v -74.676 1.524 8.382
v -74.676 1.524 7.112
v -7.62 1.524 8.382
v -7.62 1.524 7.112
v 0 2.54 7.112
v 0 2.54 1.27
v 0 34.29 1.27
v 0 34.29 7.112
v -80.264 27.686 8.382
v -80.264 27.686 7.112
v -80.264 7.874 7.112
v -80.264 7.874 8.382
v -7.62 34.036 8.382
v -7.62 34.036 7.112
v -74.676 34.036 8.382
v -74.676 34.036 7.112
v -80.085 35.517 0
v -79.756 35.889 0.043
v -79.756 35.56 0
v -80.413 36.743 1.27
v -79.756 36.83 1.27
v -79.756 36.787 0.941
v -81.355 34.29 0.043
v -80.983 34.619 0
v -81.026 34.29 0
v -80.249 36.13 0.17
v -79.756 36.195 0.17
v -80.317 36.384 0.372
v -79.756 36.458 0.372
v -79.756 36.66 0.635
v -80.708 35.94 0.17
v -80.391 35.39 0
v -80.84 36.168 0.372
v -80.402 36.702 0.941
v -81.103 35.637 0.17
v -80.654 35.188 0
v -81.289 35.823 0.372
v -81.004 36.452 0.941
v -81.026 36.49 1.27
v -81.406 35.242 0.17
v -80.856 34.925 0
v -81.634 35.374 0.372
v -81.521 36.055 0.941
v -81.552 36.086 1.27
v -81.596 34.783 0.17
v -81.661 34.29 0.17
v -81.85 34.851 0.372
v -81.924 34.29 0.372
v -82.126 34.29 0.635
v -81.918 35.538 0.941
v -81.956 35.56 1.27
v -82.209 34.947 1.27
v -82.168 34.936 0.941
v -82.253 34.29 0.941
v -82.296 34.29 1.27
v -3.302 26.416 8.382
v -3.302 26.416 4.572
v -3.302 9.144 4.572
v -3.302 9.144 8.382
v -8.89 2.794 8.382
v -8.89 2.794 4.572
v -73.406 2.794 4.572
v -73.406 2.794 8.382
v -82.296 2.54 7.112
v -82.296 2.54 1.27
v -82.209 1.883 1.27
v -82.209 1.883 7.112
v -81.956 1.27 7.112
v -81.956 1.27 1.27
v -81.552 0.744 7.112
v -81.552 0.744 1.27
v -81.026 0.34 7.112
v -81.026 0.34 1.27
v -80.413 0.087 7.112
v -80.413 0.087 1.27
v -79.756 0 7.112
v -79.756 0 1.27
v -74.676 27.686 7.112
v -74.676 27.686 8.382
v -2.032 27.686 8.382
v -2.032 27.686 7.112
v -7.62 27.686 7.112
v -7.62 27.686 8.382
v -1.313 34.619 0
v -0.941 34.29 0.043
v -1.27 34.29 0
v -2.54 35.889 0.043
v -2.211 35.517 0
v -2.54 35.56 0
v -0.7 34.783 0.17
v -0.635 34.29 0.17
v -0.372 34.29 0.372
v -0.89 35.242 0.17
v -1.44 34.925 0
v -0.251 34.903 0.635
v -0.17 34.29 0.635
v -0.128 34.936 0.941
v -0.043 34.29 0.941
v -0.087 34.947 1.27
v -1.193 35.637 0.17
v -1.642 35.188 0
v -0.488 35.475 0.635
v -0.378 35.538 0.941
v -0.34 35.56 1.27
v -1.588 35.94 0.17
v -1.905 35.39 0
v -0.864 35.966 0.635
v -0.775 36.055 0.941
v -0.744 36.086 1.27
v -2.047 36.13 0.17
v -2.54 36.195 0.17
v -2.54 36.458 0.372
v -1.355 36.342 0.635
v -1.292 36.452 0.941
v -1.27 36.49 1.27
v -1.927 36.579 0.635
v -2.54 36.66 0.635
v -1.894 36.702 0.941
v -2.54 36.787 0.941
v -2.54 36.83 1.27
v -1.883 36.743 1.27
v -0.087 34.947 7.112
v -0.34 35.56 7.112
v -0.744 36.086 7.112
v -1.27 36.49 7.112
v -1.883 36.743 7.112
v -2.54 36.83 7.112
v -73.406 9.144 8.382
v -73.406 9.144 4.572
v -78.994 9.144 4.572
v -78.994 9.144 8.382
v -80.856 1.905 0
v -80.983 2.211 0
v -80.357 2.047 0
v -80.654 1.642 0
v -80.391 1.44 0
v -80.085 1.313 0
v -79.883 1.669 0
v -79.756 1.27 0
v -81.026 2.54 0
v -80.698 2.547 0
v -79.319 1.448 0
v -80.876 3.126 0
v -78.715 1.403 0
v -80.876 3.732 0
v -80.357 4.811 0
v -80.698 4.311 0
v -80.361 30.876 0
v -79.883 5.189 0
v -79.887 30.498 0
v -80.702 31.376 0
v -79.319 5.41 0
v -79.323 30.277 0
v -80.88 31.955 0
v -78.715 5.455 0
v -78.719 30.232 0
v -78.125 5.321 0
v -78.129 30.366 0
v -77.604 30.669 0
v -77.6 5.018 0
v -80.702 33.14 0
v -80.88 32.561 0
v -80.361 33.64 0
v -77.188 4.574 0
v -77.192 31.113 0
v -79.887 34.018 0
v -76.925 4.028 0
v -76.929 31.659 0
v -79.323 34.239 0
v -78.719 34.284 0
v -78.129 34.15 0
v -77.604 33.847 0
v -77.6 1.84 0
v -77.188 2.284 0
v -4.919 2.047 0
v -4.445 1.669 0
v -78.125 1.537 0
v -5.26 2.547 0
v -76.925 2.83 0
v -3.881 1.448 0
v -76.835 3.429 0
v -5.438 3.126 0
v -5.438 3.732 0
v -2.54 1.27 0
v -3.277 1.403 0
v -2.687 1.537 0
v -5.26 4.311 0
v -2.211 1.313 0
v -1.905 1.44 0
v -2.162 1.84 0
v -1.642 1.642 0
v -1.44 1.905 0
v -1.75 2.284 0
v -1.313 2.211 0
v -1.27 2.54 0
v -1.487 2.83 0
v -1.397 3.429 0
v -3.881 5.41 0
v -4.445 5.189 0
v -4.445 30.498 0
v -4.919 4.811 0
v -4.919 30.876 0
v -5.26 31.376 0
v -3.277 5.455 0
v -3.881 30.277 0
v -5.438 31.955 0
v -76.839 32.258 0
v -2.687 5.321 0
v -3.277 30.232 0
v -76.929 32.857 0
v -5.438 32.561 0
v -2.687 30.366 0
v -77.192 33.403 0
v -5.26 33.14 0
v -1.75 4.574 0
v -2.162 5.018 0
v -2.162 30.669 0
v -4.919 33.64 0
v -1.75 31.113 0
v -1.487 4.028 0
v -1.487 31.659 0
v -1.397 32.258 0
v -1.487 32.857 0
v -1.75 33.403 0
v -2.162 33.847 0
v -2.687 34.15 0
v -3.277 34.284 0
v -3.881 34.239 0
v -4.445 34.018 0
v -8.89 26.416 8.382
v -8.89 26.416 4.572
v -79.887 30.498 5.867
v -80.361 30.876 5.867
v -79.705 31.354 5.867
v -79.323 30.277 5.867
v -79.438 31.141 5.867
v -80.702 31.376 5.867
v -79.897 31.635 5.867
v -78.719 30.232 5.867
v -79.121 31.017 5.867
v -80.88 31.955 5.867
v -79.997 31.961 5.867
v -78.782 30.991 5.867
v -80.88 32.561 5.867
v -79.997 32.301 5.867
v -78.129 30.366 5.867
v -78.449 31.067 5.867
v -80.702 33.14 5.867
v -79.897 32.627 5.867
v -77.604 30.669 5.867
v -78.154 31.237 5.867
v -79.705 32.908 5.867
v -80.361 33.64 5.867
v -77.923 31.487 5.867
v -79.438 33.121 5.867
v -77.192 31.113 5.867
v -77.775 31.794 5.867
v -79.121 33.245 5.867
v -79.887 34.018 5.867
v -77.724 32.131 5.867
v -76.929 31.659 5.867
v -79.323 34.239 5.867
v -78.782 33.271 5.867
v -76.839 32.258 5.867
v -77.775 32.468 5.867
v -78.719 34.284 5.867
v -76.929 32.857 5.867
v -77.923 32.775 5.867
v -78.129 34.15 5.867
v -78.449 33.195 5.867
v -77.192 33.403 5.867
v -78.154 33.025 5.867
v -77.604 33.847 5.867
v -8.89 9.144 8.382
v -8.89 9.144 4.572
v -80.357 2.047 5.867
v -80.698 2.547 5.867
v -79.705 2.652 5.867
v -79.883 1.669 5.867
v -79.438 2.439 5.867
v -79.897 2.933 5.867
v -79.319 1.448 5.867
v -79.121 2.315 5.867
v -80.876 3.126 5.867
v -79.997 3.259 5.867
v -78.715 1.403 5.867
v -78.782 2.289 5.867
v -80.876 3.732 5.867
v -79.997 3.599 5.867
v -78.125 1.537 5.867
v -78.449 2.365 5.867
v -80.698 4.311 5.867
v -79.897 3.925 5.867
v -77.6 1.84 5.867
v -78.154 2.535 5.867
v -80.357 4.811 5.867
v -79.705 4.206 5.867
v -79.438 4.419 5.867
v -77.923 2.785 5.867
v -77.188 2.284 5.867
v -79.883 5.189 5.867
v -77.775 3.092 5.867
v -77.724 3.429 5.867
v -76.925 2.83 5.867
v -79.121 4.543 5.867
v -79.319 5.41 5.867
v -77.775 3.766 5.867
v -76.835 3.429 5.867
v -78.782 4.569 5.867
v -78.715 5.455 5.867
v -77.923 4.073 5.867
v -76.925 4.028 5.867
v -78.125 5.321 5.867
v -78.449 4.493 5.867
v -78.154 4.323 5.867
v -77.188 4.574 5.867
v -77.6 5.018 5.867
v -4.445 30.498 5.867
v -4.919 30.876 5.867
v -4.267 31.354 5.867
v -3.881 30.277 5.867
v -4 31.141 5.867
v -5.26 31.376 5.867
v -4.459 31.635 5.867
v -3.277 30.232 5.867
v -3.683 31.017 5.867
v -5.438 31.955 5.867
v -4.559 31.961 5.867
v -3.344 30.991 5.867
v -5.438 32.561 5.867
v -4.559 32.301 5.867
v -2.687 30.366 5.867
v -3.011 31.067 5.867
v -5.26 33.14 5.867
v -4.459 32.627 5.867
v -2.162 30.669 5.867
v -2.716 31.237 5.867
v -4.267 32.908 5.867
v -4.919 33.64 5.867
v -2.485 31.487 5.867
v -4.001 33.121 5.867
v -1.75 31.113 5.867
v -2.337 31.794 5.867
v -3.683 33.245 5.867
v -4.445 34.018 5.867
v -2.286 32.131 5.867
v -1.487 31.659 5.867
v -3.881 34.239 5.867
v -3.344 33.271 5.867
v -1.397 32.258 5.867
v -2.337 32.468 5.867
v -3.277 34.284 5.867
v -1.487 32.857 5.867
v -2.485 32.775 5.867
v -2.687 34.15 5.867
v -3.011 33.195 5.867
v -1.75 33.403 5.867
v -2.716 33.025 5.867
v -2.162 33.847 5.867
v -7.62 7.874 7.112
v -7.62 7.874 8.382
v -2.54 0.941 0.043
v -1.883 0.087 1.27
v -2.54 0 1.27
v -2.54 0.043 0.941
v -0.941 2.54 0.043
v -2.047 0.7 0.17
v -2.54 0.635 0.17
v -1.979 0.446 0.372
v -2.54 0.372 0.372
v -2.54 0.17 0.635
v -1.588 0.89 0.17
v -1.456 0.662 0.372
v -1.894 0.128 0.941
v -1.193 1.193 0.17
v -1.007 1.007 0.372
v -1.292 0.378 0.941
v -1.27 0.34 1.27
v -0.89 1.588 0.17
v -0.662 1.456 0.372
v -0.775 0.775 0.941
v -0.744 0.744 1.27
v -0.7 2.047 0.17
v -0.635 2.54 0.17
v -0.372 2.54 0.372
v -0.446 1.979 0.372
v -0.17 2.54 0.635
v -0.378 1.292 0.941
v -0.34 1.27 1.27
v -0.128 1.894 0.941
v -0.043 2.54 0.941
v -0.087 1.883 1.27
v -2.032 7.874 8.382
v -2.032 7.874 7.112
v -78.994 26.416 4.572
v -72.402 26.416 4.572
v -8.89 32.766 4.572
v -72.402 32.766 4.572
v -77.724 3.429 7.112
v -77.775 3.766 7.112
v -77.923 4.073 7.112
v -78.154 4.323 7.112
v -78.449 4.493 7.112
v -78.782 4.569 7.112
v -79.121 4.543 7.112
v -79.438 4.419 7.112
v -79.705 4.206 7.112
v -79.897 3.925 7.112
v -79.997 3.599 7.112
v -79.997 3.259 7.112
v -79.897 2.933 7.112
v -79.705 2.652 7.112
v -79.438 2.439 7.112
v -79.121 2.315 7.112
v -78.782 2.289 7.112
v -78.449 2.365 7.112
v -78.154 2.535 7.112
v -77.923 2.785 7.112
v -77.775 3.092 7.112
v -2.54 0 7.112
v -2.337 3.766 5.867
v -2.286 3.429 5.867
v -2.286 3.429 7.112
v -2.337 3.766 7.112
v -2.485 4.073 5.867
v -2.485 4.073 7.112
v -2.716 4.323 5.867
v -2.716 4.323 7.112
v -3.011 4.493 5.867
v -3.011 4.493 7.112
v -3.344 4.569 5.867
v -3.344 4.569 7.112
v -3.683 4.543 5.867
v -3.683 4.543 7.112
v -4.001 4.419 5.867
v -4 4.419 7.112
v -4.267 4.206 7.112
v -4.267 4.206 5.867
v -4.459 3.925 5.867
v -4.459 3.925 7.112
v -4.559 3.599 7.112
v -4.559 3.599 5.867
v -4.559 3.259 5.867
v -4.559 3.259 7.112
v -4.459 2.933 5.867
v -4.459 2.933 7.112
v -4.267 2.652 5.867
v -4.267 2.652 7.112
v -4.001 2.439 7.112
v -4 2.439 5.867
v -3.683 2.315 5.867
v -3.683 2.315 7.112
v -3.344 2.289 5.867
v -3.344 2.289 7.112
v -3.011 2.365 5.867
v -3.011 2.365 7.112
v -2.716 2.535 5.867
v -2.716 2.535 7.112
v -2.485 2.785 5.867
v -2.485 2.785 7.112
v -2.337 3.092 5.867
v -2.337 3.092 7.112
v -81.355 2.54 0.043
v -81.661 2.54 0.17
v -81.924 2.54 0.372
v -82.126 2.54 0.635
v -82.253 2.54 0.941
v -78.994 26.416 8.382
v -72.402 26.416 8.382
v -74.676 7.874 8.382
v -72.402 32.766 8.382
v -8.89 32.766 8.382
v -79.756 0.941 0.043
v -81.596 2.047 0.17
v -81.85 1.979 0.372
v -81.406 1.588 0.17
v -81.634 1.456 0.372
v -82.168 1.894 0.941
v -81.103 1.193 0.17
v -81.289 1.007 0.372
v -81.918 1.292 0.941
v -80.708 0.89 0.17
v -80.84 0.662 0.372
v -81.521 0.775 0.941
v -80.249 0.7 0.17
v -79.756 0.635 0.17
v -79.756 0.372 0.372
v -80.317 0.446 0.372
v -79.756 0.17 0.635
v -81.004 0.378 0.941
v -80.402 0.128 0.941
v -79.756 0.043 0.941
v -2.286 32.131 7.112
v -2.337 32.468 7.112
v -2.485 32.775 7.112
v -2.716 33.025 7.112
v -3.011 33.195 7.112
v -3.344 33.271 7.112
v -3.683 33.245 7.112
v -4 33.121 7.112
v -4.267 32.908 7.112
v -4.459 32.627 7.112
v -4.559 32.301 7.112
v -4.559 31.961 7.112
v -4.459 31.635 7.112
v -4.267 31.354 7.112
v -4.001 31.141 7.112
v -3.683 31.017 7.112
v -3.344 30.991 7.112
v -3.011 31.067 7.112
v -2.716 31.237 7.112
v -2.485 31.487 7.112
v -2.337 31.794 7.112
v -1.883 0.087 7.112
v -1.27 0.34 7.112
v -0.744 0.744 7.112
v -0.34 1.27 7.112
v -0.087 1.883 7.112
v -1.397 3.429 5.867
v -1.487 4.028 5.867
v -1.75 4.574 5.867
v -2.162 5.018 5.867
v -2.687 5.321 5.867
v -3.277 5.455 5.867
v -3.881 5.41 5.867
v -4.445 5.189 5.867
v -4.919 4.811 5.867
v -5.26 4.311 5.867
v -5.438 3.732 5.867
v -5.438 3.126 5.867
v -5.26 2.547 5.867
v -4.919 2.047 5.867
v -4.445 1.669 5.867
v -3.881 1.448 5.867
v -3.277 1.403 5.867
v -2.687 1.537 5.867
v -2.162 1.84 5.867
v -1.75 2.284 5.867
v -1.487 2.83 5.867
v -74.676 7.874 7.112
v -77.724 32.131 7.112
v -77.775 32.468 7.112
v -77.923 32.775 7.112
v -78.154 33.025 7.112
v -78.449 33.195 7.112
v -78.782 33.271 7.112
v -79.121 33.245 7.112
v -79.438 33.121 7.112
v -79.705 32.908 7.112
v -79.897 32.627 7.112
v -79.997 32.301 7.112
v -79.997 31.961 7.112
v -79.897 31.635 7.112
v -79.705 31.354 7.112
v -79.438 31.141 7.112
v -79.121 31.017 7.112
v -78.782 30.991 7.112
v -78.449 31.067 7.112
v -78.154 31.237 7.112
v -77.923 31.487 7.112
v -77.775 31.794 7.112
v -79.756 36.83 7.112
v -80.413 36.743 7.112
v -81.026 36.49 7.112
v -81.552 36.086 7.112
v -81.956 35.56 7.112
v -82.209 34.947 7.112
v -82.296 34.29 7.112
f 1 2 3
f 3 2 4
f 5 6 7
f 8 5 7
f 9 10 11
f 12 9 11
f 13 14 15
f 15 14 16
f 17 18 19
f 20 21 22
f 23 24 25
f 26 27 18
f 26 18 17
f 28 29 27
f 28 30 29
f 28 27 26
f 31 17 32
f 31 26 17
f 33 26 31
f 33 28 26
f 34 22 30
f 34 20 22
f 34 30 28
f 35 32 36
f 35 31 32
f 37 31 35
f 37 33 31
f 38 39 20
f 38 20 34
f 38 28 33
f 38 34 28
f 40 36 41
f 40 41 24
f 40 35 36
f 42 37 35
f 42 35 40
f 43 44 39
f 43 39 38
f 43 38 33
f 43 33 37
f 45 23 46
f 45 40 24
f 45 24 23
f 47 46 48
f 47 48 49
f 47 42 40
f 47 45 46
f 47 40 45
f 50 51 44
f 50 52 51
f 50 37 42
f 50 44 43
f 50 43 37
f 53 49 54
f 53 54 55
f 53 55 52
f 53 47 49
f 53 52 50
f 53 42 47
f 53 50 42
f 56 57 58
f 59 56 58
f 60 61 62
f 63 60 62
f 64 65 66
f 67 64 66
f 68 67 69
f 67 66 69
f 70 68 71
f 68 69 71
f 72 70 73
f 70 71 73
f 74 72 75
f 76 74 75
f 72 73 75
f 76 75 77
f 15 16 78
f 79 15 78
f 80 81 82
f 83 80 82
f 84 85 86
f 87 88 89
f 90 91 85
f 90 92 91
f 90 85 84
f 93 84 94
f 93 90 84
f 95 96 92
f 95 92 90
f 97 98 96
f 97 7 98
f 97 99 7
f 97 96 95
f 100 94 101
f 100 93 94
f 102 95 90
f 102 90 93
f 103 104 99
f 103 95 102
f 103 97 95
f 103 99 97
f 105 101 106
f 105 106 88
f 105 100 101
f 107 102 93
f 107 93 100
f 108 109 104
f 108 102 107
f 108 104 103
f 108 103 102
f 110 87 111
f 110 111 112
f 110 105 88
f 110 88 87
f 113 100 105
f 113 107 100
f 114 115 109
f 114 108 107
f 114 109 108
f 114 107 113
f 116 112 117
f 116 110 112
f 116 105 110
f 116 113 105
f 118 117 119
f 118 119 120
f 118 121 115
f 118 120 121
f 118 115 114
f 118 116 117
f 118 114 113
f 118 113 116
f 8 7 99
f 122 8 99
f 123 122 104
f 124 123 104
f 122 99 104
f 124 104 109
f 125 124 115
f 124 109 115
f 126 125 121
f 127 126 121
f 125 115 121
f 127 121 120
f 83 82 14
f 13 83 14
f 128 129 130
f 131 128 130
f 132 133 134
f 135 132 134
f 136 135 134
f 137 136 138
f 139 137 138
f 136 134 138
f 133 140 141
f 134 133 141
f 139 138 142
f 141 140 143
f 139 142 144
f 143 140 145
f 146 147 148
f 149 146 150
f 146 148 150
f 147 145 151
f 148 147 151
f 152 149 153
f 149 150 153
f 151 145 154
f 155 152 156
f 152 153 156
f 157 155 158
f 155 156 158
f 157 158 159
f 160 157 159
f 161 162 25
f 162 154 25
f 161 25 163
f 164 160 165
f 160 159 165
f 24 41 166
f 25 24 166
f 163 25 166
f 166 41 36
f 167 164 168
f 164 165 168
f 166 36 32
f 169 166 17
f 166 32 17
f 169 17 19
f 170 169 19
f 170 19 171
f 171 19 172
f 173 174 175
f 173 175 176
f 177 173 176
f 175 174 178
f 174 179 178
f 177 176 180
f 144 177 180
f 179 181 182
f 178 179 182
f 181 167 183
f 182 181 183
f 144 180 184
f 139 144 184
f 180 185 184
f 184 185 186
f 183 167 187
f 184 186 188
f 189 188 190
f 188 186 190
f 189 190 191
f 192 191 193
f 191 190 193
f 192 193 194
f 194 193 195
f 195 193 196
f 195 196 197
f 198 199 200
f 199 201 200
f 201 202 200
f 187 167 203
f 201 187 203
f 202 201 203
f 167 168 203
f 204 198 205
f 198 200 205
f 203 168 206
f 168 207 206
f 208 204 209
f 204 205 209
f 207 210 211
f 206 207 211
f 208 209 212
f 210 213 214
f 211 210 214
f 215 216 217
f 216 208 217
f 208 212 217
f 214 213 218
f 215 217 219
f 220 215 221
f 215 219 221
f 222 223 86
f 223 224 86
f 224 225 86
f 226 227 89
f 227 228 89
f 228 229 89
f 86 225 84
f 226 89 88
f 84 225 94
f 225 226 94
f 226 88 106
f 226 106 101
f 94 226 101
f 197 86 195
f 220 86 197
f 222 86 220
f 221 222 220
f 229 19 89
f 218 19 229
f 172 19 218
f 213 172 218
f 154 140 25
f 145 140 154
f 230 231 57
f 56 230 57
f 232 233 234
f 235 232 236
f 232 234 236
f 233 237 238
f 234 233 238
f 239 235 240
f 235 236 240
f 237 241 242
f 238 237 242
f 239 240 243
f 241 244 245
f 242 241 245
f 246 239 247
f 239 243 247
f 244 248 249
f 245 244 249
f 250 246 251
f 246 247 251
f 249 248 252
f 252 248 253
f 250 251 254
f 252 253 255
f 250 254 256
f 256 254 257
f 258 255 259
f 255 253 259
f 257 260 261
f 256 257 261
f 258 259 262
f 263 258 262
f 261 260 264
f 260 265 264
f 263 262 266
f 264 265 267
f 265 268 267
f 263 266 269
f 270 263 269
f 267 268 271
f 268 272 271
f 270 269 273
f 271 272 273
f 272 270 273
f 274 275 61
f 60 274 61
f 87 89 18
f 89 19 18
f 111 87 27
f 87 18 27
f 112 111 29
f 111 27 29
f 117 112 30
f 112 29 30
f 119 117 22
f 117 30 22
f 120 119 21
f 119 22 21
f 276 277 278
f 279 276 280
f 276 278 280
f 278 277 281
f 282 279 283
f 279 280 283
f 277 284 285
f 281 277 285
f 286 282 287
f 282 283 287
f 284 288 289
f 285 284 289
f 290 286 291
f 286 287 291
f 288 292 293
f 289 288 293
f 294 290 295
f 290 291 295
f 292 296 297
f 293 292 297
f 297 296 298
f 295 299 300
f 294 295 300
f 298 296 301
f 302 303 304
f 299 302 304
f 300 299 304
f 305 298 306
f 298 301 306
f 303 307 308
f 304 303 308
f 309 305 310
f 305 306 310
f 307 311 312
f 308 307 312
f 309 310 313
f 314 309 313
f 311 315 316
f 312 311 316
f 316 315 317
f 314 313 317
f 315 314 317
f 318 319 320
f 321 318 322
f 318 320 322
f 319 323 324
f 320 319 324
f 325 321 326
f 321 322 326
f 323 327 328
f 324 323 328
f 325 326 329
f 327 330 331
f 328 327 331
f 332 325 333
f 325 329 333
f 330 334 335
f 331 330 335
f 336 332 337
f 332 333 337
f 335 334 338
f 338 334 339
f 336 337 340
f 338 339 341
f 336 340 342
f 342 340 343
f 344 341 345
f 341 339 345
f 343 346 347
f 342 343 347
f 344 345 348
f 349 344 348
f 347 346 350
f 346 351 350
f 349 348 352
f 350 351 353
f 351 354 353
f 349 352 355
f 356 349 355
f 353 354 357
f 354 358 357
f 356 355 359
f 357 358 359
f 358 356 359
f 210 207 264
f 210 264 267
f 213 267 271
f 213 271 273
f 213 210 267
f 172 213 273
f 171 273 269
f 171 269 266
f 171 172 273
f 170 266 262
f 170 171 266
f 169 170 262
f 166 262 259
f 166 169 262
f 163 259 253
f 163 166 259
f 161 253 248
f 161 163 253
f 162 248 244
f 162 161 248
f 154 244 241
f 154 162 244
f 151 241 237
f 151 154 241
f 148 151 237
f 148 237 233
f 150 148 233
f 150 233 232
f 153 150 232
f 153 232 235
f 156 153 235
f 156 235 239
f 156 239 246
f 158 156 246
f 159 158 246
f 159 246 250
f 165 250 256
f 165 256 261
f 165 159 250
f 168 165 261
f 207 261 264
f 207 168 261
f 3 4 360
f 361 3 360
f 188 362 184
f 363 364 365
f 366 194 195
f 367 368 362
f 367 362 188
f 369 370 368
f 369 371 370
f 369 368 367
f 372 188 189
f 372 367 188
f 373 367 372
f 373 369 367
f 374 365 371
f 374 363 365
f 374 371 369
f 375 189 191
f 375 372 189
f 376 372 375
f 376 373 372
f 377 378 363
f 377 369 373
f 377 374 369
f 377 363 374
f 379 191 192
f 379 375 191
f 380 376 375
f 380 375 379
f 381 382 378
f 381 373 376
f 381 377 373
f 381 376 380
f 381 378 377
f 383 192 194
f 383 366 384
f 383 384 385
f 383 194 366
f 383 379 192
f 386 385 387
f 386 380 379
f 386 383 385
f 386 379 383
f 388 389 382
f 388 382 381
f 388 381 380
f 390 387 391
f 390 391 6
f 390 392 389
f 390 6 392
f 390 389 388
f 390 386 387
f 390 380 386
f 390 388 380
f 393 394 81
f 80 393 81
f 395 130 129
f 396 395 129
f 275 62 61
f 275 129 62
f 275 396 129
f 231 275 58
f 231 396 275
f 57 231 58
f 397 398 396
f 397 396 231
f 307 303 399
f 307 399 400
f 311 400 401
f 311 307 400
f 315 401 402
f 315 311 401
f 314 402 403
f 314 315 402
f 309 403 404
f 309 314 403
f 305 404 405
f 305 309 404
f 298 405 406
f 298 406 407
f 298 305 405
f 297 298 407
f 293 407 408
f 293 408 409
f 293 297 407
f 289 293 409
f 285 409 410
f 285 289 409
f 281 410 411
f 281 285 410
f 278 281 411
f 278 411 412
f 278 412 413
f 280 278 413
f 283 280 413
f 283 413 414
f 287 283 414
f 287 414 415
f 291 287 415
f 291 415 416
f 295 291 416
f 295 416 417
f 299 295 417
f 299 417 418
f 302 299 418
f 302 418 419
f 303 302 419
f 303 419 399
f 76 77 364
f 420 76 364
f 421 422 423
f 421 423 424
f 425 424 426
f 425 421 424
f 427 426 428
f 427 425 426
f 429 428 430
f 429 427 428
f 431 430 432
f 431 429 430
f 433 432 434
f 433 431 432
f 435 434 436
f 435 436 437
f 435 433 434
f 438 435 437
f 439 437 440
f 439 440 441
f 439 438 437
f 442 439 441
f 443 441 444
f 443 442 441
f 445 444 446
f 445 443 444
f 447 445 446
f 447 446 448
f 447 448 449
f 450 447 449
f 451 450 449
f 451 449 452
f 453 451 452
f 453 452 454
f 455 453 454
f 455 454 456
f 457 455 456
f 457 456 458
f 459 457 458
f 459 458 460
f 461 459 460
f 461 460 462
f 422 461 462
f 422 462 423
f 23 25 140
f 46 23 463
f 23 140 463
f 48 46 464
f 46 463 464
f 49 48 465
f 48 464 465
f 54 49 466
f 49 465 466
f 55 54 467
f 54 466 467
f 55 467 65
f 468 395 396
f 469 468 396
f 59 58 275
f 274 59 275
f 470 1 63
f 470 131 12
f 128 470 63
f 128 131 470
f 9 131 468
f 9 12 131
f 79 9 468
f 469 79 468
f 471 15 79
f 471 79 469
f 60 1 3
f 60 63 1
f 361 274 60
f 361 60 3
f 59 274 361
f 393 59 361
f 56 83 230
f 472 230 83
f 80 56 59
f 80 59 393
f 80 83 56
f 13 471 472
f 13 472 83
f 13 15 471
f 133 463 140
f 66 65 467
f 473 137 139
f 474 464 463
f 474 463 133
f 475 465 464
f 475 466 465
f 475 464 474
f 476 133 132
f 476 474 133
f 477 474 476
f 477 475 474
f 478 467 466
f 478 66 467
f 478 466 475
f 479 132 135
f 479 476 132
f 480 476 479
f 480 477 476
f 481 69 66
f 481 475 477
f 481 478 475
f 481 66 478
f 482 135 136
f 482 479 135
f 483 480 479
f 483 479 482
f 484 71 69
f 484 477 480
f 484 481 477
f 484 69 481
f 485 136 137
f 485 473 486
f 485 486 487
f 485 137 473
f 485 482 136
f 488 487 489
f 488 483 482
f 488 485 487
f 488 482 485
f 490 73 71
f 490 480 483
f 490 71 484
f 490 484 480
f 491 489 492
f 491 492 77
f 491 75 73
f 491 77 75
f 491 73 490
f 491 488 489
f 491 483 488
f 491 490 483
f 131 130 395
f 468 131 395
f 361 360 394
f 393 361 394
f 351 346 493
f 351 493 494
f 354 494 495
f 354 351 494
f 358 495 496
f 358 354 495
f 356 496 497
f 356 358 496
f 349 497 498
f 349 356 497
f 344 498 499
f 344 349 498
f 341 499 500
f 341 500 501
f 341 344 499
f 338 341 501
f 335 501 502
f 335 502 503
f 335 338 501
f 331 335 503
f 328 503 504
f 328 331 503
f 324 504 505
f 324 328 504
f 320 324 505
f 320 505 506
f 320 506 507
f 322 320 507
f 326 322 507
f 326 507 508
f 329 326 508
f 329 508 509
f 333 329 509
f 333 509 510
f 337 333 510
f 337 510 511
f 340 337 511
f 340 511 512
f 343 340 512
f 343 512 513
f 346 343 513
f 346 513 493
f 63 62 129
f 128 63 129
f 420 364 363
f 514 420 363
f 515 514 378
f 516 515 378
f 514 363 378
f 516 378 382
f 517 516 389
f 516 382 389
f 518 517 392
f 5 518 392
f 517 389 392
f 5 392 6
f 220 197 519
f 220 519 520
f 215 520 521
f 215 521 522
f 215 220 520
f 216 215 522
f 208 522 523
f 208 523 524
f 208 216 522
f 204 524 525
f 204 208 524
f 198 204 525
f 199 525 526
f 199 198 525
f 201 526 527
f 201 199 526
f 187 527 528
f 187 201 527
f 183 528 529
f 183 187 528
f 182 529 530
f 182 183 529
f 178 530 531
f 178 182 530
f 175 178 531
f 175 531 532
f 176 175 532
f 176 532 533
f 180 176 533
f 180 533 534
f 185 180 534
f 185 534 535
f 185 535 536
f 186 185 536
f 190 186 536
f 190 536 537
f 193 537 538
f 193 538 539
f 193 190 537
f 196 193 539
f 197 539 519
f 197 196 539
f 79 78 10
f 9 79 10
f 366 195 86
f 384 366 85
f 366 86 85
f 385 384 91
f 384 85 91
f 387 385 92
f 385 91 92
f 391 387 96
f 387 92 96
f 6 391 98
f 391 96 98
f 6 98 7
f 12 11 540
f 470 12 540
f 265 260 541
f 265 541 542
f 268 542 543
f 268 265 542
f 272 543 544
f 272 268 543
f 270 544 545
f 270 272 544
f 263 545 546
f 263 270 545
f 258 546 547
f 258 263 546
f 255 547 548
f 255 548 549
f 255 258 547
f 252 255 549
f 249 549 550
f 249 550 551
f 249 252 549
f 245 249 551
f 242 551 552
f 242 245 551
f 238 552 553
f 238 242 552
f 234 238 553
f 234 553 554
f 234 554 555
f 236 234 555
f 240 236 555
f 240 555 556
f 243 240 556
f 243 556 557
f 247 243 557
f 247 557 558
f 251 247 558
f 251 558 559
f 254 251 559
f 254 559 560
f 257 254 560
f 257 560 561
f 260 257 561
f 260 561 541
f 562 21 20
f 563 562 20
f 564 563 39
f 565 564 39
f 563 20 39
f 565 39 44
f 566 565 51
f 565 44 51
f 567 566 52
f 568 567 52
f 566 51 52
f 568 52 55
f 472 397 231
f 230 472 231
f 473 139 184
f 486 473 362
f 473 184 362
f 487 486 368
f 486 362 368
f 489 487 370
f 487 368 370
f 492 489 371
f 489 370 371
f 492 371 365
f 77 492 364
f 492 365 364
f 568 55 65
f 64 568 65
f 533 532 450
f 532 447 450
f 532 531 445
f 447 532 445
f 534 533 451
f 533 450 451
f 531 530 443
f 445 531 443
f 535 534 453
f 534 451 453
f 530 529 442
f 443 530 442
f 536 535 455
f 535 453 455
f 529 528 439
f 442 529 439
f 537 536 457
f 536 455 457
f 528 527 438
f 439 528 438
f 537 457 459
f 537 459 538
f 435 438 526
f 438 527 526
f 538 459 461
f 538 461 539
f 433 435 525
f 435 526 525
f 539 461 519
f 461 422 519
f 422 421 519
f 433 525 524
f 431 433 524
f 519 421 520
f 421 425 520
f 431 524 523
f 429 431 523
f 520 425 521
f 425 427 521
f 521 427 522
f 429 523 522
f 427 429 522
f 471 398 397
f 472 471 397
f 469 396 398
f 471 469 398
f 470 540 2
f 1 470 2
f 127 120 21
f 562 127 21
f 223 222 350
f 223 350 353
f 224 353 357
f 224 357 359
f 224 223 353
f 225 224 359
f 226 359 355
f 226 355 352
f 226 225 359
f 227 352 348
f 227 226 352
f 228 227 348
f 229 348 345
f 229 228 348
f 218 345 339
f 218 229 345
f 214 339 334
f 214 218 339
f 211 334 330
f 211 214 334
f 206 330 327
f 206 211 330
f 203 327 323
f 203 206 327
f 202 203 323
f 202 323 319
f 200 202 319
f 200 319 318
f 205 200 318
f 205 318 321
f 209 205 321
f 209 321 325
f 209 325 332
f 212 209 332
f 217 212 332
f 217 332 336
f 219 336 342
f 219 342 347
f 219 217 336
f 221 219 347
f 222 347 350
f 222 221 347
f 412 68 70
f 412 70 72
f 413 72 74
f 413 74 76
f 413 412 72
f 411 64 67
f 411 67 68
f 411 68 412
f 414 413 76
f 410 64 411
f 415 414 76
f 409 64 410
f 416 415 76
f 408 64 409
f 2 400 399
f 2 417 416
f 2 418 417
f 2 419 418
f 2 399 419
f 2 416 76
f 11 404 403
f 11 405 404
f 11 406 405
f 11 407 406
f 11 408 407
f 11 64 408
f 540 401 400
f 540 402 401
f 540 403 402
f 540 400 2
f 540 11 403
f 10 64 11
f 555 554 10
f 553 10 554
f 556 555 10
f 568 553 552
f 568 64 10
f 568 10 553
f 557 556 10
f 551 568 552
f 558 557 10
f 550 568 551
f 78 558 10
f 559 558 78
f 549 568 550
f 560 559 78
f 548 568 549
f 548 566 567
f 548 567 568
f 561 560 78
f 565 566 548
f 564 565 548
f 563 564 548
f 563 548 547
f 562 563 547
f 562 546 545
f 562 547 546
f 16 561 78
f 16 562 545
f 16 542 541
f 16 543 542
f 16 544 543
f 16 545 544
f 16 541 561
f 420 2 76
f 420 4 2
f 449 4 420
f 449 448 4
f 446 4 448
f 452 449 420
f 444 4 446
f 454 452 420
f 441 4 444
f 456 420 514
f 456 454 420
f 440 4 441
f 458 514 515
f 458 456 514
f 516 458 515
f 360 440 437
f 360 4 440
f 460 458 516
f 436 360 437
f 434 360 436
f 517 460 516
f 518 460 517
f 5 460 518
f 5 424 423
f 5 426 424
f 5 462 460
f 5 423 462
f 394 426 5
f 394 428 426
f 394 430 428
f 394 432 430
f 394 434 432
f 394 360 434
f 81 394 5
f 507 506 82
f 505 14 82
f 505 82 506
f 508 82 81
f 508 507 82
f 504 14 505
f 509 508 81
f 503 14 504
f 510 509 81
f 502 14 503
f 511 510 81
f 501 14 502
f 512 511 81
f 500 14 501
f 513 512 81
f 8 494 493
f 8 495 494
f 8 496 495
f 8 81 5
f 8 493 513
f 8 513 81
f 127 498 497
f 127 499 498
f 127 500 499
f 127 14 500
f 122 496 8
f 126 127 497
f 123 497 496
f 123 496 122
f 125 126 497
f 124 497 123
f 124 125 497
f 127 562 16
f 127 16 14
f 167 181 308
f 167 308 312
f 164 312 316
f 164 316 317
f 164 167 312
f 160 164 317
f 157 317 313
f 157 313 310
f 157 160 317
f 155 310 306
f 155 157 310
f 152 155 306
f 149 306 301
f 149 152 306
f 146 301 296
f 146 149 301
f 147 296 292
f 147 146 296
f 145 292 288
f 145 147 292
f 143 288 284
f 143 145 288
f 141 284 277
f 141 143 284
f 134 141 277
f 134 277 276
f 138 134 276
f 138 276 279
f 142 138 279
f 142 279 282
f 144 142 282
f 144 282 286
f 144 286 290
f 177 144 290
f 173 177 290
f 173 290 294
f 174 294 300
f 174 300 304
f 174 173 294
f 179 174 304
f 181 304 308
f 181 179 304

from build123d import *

# Parameters (mm, degrees)
F0_R     = 1.143
F1_DEPTH = 7.112
F2_DEPTH = 8.382
F3_DEPTH = 4.572
F4_R     = 2.032
F5_DEPTH = 5.8674
F6_R     = 1.27


with BuildPart() as f1:
    # F0 (on Top) → F1 (new body)
    with BuildSketch(Plane.XY):
        with BuildLine():
            ThreePointArc((-2.54, 0), (-0.743949, 0.743949), (0, 2.54))
            Line((0, 2.54), (0, 34.29))
            ThreePointArc((0, 34.29), (-0.743949, 36.086051), (-2.54, 36.83))
            Line((-2.54, 36.83), (-79.756, 36.83))
            ThreePointArc((-79.756, 36.83), (-81.552051, 36.086051), (-82.296, 34.29))
            Line((-82.296, 34.29), (-82.296, 2.54))
            ThreePointArc((-82.296, 2.54), (-81.552051, 0.743949), (-79.756, 0))
            Line((-79.756, 0), (-2.54, 0))
        make_face()
        with Locations((-78.867, 3.429)):
            Circle(F0_R, mode=Mode.SUBTRACT)
        with Locations((-3.429, 3.429)):
            Circle(F0_R, mode=Mode.SUBTRACT)
        Polygon((-7.62, 7.874), (-7.62, 1.524), (-74.676, 1.524), (-74.676, 7.874), (-80.264, 7.874), (-80.264, 27.686), (-74.676, 27.686), (-74.676, 34.036), (-7.62, 34.036), (-7.62, 27.686), (-2.032, 27.686), (-2.032, 7.874), align=None, mode=Mode.SUBTRACT)
        with Locations((-78.867, 32.131)):
            Circle(F0_R, mode=Mode.SUBTRACT)
        with Locations((-3.429, 32.131)):
            Circle(F0_R, mode=Mode.SUBTRACT)
    extrude(amount=F1_DEPTH)

    # F0 (on Top) → F2 (join)
    with BuildSketch(Plane.XY):
        Polygon((-74.676, 1.524), (-7.62, 1.524), (-7.62, 7.874), (-2.032, 7.874), (-2.032, 27.686), (-7.62, 27.686), (-7.62, 34.036), (-74.676, 34.036), (-74.676, 27.686), (-80.264, 27.686), (-80.264, 7.874), (-74.676, 7.874), align=None)
        Polygon((-8.89, 9.144), (-8.89, 2.794), (-73.406, 2.794), (-73.406, 9.144), (-78.994, 9.144), (-78.994, 26.416), (-72.402207, 26.416), (-72.402207, 32.766), (-8.89, 32.766), (-8.89, 26.416), (-3.302, 26.416), (-3.302, 9.144), align=None, mode=Mode.SUBTRACT)
    extrude(amount=F2_DEPTH)

    # F0 (on Top) → F3 (join)
    with BuildSketch(Plane.XY):
        Polygon((-73.406, 2.794), (-8.89, 2.794), (-8.89, 9.144), (-3.302, 9.144), (-3.302, 26.416), (-8.89, 26.416), (-8.89, 32.766), (-72.402207, 32.766), (-72.402207, 26.416), (-78.994, 26.416), (-78.994, 9.144), (-73.406, 9.144), align=None)
    extrude(amount=F3_DEPTH)

    # F4 (on face) → F5 (cut)
    with BuildSketch(Plane.XY):
        with Locations((-3.429, 32.258)):
            Circle(F4_R)
        with Locations((-78.871086, 32.258)):
            Circle(F4_R)
        with Locations((-3.429, 3.429)):
            Circle(F4_R)
        with Locations((-78.867, 3.429)):
            Circle(F4_R)
    extrude(amount=F5_DEPTH, mode=Mode.SUBTRACT)

    # F6
    f6_edges = [f1.edges().sort_by_distance(p)[0] for p in [
        (-41.148, 36.83, 0),
    ]]
    fillet(f6_edges, radius=F6_R)


solid = f1.part
